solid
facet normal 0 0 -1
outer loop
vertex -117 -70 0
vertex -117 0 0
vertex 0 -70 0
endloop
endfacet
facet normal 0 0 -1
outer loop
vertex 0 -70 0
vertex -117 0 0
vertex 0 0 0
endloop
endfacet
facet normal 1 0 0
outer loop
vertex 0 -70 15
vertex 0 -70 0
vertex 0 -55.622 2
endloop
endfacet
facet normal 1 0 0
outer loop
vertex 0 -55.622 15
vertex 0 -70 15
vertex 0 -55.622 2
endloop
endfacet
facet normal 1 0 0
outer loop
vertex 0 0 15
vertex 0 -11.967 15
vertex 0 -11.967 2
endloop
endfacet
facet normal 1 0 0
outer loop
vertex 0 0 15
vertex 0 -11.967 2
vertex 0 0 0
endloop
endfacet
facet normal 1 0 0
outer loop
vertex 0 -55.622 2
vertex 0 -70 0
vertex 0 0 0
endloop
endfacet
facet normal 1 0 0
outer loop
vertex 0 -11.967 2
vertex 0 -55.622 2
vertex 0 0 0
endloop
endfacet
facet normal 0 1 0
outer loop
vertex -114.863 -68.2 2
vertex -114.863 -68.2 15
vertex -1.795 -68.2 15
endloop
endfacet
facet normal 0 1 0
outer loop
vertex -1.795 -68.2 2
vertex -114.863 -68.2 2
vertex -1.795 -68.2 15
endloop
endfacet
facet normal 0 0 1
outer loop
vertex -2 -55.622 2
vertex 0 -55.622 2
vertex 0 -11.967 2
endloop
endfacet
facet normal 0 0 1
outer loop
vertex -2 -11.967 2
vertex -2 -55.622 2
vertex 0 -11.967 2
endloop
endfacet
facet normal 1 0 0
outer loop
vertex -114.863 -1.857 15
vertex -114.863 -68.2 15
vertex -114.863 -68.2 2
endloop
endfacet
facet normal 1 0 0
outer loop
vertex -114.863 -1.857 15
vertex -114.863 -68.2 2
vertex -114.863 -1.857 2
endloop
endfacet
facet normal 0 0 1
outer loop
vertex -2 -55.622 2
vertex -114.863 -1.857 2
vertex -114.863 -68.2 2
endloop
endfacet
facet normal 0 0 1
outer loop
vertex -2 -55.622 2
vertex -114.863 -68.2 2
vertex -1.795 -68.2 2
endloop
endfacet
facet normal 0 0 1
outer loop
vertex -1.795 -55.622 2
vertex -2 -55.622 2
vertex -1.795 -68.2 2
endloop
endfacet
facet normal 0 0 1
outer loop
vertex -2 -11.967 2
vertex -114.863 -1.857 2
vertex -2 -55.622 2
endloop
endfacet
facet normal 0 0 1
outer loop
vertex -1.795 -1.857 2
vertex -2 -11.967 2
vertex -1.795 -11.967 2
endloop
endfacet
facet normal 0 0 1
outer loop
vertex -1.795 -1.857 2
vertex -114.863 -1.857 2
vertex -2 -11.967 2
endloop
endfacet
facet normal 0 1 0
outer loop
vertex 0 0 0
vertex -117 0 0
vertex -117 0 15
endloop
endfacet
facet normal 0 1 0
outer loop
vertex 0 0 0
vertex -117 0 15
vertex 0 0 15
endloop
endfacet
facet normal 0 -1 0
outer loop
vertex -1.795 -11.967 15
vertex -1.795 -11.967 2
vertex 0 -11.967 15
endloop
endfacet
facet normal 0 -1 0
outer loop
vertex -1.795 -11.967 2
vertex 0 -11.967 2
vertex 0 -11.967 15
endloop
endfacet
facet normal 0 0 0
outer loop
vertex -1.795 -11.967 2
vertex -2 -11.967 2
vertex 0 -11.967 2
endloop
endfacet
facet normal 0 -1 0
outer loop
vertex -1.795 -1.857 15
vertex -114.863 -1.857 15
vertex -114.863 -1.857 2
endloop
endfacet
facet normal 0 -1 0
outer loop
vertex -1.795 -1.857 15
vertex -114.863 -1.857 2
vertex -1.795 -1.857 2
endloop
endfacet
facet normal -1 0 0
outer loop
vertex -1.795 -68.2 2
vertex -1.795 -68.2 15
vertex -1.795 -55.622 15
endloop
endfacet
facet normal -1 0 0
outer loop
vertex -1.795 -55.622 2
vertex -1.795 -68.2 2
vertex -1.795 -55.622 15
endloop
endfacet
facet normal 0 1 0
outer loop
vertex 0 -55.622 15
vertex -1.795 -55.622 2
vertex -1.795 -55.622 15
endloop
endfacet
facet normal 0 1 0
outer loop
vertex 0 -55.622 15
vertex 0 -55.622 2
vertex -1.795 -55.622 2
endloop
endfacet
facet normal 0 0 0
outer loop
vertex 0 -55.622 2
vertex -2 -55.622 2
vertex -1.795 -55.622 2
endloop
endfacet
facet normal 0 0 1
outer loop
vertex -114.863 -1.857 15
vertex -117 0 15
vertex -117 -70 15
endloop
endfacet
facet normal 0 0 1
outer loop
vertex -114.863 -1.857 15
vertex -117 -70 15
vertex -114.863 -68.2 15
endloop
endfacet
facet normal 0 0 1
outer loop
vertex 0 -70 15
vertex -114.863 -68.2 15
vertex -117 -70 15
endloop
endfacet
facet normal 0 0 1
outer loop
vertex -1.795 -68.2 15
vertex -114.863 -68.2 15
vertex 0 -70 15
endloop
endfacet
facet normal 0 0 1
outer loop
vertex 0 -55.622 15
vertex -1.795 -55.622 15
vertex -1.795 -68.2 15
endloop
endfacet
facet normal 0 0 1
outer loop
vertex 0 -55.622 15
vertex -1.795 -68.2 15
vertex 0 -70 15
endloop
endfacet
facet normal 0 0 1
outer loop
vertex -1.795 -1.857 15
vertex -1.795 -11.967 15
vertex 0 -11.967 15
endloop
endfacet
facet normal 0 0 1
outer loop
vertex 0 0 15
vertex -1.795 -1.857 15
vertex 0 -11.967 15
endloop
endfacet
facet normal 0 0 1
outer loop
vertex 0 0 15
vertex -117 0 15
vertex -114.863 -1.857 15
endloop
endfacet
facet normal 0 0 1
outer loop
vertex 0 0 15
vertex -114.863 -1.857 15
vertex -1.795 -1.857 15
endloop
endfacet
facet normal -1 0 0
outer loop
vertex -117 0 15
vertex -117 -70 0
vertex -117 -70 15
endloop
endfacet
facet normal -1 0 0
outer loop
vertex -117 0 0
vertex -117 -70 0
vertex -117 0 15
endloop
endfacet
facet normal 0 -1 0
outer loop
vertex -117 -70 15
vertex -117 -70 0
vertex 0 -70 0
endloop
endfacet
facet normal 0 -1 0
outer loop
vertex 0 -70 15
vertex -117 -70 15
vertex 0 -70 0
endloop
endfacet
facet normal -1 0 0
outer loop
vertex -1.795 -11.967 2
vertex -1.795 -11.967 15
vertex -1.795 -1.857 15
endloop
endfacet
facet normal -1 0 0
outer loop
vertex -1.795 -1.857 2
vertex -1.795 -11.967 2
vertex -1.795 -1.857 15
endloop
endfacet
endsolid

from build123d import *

# Parameters (mm, degrees)
SKETCH_W        = 117
SKETCH_H        = 70
PAD_DEPTH       = 15
SKETCH001_W     = 113.068136
SKETCH001_H     = 66.343485
POCKET_DEPTH    = 13
SKETCH002_W     = 43.654532
SKETCH002_H     = 15.131113
POCKET001_DEPTH = 2


with BuildPart() as part:
    # Sketch → Pad (new body)
    with BuildSketch(Plane.XY):
        with Locations((-58.5, -35)):
            Rectangle(SKETCH_W, SKETCH_H)
    extrude(amount=PAD_DEPTH)

    # Sketch001 (on Face6 of Pad) → Pocket (cut)
    with BuildSketch(Plane.XY.offset(15)):
        with Locations((-58.329235, -35.028484)):
            Rectangle(SKETCH001_W, SKETCH001_H)
    extrude(amount=-POCKET_DEPTH, mode=Mode.SUBTRACT)

    # Sketch002 (on Face2 of Pocket) → Pocket001 (cut)
    with BuildSketch(Plane.YZ):
        with Locations((-33.794312, 9.565556)):
            Rectangle(SKETCH002_W, SKETCH002_H)
    extrude(amount=-POCKET001_DEPTH, mode=Mode.SUBTRACT)


solid = part.part
